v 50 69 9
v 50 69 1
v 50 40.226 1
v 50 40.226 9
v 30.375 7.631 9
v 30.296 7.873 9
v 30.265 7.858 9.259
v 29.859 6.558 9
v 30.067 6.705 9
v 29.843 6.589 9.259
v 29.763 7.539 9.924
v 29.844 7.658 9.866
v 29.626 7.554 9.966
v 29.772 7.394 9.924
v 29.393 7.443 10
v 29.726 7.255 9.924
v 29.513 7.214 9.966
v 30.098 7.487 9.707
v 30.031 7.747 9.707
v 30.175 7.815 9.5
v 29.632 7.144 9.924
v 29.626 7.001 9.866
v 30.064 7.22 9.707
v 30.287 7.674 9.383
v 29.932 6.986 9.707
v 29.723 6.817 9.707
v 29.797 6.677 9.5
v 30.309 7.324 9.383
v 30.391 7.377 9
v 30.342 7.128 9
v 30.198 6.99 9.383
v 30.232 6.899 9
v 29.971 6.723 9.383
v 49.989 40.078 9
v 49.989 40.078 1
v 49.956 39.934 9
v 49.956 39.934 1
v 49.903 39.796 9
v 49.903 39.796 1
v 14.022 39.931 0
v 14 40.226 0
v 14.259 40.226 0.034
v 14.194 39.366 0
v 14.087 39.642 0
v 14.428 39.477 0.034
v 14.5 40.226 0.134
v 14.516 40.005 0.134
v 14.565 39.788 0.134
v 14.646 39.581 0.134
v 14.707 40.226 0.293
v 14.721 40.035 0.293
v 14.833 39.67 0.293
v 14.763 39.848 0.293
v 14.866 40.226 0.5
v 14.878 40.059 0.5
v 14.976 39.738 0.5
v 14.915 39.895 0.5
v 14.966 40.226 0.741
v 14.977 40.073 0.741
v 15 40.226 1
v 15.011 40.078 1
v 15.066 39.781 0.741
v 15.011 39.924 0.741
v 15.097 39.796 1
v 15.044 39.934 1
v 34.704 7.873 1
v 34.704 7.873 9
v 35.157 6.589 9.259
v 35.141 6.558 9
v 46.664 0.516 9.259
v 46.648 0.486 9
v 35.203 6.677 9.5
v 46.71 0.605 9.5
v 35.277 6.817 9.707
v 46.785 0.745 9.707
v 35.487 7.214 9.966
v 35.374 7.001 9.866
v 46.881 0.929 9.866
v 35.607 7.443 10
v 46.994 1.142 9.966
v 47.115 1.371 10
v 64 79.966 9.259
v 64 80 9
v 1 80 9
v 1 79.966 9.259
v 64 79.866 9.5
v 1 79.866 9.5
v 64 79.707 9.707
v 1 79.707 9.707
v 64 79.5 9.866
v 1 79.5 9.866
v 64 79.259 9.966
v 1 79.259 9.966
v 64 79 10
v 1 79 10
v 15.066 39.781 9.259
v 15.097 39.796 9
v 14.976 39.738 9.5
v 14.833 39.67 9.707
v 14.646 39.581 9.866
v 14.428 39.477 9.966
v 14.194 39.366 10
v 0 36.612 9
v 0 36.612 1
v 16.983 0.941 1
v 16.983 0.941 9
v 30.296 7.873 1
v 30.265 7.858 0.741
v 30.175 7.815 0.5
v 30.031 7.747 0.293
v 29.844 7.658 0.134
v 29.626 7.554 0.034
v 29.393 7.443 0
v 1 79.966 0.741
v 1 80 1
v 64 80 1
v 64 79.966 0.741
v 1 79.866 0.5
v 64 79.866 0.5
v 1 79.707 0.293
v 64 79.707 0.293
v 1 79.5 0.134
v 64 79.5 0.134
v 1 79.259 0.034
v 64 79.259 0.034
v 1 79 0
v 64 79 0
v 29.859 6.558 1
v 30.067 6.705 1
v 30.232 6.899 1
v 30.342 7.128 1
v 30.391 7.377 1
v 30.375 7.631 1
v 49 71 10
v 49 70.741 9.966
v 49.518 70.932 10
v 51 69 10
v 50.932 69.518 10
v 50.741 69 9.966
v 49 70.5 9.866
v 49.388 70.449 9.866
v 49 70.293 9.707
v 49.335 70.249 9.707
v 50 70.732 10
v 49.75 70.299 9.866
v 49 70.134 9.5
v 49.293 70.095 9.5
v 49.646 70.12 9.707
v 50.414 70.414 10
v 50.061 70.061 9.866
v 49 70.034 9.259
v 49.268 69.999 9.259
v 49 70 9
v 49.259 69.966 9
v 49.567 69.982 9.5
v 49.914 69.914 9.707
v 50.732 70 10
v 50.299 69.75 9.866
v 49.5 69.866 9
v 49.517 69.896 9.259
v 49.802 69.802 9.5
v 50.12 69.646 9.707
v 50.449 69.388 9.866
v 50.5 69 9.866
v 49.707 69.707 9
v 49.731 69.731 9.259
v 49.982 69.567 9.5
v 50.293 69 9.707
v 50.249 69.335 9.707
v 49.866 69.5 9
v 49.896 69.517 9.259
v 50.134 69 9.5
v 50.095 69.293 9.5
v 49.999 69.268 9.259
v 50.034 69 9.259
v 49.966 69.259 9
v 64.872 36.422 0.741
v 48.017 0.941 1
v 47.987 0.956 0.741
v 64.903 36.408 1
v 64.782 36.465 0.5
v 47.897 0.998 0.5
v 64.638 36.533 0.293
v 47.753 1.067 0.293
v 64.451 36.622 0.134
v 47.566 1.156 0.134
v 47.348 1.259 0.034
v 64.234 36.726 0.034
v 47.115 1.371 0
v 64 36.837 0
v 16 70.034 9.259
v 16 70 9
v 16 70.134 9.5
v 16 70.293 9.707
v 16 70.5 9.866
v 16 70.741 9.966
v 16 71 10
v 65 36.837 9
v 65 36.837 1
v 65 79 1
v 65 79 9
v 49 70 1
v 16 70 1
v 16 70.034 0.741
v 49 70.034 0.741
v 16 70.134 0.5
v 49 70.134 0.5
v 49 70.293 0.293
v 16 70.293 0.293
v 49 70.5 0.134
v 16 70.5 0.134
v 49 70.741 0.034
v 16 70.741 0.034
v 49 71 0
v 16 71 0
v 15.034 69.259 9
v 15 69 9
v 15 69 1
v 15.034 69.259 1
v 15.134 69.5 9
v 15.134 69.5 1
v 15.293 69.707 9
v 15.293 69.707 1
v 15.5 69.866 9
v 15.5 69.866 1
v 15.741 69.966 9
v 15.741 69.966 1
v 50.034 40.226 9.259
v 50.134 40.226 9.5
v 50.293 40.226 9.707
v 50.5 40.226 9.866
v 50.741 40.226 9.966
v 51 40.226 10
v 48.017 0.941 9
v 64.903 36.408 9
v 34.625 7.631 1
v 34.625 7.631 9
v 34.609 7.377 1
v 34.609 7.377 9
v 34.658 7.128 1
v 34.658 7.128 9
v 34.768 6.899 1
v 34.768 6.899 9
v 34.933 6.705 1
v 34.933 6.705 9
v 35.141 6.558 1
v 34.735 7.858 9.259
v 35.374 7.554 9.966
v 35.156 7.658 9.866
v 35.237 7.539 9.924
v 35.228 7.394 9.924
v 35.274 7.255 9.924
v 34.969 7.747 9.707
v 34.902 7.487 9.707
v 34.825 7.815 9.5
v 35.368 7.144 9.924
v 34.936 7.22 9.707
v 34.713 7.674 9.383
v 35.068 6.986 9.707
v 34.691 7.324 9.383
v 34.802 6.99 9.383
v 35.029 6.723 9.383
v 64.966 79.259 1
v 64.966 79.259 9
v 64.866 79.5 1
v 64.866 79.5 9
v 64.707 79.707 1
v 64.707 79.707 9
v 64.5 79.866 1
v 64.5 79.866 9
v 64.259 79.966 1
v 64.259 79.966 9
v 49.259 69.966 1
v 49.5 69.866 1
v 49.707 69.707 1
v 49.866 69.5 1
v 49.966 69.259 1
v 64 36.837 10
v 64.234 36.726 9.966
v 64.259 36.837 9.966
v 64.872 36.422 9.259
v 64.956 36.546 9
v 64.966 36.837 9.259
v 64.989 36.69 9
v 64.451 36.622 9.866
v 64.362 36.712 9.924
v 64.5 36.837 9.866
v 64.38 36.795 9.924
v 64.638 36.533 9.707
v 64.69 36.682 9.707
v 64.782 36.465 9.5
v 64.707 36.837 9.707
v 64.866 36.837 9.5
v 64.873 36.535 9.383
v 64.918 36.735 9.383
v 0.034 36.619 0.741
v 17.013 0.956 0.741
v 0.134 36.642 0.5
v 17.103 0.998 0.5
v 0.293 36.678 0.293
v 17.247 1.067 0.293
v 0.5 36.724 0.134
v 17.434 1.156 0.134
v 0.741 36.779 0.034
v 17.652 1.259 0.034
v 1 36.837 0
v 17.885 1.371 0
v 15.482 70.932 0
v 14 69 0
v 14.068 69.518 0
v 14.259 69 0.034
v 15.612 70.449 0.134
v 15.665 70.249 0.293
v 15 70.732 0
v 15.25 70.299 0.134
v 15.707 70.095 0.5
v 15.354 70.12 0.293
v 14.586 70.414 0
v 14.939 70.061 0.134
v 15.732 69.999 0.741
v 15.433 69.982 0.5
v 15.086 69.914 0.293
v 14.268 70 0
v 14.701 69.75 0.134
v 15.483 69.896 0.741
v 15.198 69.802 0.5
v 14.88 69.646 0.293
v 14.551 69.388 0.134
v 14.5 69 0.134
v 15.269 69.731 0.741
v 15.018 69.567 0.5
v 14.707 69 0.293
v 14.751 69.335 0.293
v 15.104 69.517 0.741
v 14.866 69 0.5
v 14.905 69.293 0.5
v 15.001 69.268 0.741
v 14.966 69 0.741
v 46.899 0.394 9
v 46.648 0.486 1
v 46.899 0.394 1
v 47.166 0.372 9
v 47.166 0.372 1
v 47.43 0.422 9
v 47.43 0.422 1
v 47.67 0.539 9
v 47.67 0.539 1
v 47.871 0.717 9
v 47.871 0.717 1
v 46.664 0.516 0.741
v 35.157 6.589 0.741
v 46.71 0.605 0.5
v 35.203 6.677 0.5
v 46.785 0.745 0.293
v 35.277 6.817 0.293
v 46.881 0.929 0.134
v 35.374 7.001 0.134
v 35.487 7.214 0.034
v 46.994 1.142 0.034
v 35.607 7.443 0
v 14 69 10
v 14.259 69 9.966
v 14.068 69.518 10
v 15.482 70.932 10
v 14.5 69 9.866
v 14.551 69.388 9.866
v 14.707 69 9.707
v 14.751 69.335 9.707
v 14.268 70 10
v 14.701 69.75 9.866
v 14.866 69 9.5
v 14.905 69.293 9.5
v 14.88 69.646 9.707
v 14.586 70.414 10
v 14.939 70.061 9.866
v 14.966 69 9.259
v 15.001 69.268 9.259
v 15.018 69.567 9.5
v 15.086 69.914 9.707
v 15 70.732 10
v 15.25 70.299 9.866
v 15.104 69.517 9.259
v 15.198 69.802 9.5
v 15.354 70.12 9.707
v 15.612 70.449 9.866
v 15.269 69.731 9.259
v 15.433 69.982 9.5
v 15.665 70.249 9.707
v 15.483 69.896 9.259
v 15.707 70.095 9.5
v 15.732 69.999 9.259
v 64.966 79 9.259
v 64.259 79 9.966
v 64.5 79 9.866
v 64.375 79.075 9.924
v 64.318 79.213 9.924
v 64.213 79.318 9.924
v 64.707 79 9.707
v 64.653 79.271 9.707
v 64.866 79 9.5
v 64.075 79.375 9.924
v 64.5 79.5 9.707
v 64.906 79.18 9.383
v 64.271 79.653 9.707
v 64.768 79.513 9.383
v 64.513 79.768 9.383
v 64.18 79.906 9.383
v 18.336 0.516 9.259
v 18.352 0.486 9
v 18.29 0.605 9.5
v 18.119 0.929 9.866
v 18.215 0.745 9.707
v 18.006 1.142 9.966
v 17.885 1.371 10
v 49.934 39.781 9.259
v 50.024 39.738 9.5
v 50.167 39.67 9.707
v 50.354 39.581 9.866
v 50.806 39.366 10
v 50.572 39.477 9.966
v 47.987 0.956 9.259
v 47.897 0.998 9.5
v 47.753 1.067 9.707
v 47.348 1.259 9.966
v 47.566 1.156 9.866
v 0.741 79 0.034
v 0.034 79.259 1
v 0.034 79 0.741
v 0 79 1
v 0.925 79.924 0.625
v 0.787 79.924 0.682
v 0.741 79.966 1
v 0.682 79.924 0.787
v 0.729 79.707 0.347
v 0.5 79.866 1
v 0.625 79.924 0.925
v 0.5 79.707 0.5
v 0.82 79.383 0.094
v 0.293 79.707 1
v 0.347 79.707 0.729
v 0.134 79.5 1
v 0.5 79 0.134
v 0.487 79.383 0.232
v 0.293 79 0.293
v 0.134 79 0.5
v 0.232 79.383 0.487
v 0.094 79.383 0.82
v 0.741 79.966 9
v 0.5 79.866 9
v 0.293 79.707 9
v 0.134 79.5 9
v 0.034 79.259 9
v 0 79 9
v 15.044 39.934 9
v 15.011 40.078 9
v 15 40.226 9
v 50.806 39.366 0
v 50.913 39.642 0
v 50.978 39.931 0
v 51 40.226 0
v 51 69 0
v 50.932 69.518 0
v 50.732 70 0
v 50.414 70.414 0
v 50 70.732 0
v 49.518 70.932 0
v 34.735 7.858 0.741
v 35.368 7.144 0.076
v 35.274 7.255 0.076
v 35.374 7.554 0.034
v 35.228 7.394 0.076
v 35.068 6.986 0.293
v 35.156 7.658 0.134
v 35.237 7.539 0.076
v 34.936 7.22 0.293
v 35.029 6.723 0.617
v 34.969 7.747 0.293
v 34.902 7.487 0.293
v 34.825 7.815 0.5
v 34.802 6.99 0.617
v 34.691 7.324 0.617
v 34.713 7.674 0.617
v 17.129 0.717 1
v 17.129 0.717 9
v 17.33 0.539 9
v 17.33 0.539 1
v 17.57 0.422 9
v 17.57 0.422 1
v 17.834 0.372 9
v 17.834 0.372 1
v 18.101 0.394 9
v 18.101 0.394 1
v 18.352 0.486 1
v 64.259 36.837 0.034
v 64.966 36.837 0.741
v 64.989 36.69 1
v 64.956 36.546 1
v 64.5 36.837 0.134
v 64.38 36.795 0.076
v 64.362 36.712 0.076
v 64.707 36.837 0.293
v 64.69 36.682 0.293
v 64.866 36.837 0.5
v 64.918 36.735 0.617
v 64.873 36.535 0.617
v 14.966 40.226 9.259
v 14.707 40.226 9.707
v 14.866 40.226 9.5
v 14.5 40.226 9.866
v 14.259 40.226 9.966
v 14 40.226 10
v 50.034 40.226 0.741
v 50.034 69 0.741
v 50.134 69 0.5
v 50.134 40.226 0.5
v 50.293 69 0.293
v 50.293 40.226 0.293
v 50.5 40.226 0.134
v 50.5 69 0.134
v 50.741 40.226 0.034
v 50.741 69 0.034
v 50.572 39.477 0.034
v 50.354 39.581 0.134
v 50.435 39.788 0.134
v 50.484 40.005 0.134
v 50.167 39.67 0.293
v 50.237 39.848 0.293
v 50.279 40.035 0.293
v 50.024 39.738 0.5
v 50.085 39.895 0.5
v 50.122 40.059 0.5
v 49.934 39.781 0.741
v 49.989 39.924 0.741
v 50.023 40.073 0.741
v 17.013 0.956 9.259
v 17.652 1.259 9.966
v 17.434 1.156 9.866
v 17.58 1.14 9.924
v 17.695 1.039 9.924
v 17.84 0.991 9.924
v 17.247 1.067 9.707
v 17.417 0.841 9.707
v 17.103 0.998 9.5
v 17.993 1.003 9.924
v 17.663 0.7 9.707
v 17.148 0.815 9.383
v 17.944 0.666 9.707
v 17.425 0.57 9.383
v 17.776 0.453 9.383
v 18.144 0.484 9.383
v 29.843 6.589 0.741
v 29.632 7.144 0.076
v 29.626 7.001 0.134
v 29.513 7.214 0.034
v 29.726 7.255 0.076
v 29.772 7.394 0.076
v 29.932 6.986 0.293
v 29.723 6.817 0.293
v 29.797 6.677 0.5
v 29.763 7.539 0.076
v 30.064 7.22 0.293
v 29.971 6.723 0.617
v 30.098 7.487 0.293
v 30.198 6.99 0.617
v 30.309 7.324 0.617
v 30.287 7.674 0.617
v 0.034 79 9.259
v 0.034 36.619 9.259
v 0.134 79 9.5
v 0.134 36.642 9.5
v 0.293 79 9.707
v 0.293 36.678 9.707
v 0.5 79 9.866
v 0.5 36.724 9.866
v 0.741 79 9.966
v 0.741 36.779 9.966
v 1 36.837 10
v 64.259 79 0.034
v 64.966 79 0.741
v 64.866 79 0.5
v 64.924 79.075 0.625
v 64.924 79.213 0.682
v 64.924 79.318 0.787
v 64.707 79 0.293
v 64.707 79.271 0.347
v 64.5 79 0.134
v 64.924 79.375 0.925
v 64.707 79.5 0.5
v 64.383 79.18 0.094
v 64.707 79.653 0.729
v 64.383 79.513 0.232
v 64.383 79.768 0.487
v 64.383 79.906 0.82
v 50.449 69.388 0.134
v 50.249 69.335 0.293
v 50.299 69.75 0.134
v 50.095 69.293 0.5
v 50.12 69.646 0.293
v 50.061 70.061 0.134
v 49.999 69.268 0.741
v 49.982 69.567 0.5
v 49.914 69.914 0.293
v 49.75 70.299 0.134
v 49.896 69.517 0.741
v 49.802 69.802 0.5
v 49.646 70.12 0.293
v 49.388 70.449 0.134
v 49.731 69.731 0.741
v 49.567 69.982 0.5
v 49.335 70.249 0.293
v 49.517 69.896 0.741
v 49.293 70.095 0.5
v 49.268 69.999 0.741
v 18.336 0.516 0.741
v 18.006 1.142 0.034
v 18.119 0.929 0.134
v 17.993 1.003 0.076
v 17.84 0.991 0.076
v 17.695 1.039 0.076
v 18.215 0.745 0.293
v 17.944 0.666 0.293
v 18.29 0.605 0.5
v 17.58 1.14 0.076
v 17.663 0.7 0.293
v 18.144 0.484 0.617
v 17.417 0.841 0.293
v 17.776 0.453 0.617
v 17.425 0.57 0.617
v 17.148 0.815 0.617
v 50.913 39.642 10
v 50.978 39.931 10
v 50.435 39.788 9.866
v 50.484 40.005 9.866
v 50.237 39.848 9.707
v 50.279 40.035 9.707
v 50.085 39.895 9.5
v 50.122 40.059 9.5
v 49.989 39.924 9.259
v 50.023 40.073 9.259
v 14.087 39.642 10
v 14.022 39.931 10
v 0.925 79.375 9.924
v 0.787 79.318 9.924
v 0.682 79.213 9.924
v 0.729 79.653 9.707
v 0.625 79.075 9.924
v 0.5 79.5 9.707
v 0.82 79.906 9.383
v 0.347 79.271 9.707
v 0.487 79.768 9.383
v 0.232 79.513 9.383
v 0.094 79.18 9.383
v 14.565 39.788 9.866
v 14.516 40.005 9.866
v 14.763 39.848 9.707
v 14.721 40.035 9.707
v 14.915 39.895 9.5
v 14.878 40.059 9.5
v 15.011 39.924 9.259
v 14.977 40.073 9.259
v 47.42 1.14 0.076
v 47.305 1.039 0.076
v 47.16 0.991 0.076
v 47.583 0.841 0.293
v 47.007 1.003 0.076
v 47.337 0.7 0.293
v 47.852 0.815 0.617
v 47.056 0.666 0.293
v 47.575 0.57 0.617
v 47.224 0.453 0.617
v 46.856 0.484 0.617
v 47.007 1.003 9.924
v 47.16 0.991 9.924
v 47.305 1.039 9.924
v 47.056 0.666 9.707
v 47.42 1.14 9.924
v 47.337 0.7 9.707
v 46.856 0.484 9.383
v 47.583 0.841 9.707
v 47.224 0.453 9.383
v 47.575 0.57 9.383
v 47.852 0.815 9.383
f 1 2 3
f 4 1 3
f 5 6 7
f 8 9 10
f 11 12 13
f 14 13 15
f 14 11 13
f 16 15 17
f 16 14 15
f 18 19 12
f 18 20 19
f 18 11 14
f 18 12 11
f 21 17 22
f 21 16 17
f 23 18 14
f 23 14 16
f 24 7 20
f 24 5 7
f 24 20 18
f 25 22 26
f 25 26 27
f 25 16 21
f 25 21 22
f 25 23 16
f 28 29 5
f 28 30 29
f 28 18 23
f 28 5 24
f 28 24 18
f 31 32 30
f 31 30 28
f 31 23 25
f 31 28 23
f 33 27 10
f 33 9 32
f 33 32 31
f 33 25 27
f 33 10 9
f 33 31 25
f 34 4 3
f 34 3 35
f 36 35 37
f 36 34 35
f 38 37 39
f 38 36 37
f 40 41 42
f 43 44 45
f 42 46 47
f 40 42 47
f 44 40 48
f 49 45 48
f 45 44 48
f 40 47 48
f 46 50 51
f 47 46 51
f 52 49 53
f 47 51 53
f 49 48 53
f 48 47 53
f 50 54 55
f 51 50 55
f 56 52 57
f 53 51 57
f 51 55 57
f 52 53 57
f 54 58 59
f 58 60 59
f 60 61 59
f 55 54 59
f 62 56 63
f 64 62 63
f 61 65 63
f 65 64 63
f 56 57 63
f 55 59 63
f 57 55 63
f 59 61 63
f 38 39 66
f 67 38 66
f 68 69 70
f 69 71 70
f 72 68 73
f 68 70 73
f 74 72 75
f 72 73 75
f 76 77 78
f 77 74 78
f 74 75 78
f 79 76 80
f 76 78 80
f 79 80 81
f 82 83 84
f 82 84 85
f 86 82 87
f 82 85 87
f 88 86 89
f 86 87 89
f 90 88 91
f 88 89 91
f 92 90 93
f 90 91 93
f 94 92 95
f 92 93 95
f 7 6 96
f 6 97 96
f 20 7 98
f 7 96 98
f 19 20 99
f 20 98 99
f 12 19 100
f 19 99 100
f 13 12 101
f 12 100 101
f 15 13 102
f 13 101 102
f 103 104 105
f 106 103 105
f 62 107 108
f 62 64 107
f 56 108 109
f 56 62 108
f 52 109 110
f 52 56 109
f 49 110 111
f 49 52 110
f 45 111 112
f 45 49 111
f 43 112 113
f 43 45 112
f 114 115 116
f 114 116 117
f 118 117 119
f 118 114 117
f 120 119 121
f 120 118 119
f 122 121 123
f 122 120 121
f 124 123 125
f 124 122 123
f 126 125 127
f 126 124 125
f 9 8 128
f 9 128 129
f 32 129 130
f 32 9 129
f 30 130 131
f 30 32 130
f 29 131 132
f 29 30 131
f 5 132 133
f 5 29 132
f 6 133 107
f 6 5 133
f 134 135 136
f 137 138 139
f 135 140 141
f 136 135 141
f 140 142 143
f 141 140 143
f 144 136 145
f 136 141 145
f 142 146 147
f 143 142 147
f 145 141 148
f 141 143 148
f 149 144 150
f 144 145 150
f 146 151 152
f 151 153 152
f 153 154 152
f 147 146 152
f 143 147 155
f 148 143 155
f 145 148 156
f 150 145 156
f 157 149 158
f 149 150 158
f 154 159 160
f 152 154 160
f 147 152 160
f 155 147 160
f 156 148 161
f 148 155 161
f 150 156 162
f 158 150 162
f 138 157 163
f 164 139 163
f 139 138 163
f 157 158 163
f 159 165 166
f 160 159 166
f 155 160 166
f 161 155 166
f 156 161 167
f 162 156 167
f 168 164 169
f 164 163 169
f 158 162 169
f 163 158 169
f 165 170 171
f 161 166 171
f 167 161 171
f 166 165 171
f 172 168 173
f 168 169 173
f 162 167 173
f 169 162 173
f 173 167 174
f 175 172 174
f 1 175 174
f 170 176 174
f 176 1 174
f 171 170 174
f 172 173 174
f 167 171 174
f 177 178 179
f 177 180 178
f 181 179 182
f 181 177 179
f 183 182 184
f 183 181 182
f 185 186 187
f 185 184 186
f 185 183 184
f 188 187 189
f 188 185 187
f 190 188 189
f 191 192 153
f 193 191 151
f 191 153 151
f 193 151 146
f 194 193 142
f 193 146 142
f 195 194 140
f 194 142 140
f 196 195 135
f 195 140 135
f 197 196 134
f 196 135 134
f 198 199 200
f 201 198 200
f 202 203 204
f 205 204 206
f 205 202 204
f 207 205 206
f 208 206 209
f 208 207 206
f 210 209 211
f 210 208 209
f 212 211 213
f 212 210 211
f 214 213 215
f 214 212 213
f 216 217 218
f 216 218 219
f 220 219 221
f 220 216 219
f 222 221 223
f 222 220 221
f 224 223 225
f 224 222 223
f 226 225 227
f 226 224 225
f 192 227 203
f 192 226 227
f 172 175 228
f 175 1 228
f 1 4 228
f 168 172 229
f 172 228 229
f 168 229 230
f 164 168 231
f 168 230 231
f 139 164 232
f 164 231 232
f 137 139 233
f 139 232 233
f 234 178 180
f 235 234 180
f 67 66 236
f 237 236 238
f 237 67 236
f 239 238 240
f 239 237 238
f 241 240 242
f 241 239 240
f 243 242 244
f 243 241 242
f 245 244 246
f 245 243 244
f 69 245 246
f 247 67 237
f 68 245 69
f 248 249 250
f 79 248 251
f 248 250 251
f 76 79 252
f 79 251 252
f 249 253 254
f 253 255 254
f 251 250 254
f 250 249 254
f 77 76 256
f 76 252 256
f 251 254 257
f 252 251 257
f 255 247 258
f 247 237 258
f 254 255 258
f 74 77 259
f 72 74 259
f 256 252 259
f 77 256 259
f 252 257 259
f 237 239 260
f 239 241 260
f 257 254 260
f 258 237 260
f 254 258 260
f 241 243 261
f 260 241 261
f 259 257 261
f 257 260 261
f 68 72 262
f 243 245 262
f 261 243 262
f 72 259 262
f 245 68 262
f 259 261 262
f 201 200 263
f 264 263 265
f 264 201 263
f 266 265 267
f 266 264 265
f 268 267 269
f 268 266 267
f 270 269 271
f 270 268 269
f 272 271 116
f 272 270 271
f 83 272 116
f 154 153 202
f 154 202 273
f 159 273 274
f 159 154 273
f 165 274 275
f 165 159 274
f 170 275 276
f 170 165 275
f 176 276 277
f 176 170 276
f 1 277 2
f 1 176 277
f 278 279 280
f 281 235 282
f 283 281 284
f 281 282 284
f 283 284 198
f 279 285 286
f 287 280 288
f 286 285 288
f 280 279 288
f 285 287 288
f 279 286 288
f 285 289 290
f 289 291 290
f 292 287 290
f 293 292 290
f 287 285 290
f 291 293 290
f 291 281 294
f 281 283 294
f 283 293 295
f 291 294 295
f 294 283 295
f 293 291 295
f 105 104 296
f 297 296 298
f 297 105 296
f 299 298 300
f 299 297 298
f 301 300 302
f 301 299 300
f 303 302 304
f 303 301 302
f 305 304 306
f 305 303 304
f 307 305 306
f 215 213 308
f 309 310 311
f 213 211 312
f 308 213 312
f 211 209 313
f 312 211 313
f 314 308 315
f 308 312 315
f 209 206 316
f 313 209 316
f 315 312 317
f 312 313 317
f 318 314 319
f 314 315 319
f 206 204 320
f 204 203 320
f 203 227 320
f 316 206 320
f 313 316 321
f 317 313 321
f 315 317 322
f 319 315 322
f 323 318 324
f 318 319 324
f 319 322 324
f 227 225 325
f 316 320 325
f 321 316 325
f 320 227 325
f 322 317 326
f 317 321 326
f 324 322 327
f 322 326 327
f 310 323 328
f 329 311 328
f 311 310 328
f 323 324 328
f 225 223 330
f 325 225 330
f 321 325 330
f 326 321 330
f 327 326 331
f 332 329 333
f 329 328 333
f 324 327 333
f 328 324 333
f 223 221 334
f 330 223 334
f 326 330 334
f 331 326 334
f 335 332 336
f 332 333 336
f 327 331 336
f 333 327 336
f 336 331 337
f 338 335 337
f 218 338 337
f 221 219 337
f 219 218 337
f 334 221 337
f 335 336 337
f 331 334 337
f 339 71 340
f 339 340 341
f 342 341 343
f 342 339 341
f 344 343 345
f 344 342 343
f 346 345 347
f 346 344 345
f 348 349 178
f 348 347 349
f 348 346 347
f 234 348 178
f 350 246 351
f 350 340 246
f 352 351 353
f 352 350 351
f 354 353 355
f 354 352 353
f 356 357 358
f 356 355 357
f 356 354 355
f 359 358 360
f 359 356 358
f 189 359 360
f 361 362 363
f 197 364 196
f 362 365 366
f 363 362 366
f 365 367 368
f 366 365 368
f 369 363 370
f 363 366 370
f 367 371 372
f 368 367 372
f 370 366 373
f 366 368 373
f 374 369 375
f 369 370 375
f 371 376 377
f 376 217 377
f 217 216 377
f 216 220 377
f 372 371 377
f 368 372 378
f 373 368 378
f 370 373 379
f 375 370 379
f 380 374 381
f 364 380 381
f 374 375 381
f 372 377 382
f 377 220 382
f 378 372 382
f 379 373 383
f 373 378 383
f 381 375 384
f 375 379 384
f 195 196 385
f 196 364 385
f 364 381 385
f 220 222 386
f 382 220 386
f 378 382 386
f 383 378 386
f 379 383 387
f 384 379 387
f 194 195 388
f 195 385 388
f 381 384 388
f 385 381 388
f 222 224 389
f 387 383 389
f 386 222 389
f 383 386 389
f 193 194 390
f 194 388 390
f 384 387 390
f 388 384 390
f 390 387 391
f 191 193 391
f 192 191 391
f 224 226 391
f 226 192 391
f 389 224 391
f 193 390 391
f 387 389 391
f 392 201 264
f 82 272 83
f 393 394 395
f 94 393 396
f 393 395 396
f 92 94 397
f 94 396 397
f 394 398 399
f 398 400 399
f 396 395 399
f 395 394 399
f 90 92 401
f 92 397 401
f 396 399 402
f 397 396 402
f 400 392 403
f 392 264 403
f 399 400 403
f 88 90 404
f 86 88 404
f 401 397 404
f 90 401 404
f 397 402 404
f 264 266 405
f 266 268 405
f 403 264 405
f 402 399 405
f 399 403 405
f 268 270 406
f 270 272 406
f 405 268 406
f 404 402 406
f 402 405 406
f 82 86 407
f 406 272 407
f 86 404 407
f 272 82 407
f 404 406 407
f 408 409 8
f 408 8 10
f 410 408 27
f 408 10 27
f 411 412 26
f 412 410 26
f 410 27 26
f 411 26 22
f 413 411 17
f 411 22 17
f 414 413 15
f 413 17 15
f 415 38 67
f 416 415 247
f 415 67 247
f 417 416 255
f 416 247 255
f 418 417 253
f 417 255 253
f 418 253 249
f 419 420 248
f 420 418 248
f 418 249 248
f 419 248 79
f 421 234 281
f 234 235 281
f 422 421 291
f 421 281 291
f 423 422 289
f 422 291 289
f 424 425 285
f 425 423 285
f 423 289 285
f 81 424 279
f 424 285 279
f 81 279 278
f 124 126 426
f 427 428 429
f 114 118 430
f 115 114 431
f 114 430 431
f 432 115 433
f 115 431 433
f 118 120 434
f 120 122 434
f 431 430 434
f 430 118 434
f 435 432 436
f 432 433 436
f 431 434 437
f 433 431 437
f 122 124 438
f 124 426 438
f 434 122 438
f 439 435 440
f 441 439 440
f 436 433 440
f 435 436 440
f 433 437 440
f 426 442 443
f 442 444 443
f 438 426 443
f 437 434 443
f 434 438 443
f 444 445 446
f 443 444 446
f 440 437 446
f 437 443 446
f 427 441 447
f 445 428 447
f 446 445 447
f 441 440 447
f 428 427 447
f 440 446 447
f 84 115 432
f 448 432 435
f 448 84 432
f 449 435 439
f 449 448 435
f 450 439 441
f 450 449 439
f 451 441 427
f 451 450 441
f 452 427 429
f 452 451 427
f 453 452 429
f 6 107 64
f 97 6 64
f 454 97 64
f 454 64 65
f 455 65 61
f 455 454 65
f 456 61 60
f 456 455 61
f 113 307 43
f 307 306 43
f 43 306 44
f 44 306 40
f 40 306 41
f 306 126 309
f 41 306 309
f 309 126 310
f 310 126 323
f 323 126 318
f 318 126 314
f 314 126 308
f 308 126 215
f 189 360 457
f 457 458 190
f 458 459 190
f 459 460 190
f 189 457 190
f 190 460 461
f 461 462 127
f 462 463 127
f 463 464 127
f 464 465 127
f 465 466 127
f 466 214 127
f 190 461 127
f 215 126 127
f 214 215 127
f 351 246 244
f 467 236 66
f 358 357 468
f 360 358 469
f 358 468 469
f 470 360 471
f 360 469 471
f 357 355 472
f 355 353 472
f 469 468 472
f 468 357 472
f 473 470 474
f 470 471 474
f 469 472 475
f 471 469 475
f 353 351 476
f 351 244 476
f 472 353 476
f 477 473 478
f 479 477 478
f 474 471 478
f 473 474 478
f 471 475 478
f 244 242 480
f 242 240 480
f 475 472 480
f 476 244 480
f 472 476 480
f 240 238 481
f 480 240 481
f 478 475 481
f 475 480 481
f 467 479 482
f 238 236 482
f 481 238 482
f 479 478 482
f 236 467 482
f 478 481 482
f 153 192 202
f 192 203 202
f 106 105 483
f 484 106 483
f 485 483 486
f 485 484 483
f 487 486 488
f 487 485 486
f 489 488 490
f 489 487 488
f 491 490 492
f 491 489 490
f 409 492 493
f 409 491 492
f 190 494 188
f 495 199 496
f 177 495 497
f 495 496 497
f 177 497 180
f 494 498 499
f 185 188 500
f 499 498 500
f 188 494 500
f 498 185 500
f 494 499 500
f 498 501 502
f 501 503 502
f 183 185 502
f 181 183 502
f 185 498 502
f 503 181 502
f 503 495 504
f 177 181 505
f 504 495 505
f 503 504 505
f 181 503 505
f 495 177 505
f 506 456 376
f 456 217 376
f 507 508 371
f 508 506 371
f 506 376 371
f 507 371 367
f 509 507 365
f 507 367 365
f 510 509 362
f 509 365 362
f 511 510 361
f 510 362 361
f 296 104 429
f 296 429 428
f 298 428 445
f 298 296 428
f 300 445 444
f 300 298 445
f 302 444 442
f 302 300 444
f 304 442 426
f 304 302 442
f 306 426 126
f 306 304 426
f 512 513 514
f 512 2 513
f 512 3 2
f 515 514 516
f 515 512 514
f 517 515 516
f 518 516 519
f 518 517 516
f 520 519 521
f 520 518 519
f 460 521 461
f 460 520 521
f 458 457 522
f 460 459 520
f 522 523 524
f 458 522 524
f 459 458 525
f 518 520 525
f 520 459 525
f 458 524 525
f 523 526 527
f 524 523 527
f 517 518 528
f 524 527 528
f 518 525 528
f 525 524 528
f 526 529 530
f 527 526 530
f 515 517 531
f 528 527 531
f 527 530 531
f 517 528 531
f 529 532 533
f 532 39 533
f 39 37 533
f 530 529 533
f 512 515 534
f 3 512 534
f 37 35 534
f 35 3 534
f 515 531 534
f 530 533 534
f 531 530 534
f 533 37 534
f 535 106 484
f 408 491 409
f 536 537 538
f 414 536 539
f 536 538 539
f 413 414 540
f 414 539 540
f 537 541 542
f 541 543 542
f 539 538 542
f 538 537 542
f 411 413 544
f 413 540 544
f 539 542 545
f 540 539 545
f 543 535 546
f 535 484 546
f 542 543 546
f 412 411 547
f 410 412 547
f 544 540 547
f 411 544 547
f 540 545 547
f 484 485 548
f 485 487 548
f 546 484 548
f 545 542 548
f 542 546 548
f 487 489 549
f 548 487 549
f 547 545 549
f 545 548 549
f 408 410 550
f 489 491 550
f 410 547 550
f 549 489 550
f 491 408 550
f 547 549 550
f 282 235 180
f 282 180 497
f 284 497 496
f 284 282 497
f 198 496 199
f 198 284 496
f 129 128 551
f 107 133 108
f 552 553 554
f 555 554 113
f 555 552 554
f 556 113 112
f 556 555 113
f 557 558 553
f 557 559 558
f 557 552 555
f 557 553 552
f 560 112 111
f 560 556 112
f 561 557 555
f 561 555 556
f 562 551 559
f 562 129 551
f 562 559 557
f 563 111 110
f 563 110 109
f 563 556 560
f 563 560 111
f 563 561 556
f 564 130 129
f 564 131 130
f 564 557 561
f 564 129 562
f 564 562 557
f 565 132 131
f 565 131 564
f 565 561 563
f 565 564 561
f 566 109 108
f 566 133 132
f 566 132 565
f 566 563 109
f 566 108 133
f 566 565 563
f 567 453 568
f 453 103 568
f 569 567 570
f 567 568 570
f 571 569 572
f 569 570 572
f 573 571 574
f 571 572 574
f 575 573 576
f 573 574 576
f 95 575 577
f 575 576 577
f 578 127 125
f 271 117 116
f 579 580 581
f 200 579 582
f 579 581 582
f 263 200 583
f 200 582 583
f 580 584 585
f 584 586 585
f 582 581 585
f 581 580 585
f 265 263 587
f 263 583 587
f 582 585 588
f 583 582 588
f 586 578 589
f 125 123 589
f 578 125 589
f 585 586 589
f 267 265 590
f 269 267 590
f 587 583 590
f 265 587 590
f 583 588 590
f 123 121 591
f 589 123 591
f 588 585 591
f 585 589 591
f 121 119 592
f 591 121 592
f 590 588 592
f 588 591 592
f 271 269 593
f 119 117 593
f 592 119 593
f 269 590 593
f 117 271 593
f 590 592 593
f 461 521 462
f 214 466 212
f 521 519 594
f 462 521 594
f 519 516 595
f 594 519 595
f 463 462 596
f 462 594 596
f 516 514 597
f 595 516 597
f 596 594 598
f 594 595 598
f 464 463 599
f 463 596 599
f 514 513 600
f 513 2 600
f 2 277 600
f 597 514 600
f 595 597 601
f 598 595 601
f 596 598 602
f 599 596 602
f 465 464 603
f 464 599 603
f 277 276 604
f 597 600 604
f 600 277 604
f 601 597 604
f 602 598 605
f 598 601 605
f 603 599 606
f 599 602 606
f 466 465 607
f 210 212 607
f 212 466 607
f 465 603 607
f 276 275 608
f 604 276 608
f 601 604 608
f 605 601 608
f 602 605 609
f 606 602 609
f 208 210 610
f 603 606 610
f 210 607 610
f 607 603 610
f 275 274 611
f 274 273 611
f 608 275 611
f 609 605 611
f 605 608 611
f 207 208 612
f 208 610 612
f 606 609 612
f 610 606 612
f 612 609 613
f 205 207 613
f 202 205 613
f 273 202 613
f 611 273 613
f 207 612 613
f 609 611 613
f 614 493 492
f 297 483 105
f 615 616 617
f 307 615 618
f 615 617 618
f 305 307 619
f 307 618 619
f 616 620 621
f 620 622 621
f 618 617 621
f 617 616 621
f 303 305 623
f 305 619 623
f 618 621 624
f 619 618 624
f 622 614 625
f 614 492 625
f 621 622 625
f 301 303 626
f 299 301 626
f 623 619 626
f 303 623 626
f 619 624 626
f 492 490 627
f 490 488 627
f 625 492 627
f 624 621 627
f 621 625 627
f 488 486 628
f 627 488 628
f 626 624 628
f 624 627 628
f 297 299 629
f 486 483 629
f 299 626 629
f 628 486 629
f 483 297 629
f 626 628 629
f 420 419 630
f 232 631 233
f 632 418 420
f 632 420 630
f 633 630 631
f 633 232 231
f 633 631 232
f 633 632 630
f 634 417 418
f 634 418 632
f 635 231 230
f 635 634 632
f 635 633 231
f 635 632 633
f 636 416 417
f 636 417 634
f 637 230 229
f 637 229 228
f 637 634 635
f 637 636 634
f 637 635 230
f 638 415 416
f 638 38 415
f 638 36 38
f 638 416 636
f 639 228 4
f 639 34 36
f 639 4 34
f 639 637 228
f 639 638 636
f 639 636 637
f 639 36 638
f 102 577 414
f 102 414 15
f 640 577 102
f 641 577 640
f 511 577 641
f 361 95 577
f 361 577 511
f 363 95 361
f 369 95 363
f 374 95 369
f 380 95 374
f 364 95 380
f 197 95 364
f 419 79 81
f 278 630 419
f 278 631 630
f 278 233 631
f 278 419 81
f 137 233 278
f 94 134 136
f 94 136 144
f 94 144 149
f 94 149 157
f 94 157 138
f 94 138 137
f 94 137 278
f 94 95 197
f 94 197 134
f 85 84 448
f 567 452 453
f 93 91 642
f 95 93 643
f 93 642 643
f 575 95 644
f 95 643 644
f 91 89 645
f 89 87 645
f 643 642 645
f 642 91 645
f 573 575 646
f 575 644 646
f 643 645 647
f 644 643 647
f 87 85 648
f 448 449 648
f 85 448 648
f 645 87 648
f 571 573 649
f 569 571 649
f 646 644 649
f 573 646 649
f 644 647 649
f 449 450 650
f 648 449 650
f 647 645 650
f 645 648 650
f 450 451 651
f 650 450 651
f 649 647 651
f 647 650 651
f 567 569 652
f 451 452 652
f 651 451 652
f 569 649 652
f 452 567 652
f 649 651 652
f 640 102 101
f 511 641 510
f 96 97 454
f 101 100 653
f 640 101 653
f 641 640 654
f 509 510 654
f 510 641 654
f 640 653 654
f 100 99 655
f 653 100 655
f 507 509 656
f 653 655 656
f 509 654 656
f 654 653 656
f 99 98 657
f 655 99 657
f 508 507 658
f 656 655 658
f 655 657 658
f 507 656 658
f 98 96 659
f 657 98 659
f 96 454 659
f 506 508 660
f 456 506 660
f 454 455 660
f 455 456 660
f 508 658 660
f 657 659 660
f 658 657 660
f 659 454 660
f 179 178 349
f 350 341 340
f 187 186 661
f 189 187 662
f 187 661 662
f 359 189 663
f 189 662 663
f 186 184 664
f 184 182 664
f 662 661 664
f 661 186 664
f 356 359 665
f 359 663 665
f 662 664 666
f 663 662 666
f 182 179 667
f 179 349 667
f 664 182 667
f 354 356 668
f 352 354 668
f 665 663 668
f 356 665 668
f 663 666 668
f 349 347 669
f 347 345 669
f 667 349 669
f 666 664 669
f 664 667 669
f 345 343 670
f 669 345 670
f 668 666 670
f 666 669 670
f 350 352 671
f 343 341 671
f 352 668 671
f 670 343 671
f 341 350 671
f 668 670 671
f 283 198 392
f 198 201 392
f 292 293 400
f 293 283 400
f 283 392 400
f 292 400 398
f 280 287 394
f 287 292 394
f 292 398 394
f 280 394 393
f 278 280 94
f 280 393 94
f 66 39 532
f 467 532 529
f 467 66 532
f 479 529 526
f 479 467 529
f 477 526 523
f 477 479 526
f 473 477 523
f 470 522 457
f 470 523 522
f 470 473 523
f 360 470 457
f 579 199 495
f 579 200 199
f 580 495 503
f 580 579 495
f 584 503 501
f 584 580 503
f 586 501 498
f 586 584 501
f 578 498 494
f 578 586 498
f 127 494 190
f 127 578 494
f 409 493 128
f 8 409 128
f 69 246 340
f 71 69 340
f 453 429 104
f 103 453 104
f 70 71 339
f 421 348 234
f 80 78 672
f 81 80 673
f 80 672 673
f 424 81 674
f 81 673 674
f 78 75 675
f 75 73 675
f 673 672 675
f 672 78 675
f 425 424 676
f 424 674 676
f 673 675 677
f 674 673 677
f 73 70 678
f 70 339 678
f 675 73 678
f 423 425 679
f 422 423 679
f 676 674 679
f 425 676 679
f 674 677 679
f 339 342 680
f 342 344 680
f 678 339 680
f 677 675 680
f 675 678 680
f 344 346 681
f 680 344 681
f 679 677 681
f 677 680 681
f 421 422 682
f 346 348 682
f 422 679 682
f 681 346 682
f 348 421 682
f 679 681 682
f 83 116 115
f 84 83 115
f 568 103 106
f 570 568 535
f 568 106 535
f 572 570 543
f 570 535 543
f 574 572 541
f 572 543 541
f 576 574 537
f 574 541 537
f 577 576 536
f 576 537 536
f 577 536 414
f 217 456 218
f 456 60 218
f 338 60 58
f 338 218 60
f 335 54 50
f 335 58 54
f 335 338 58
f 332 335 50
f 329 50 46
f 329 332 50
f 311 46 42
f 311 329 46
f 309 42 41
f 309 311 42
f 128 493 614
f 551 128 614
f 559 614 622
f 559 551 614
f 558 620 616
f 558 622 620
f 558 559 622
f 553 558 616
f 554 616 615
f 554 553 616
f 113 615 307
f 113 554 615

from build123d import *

# Parameters (mm, degrees)
BOSS_EXTRUDE1_DEPTH = 10
FILLET1_R           = 1


with BuildPart() as part:
    # Sketch1 → Boss-Extrude1 (new body)
    with BuildSketch(Plane.XY):
        Polygon((0, 40), (0, 36.611522599), (17.430453908, 0), (30.708058647, 7.006255421), (15, 40), (15, 70), (50, 70), (50, 40), (34.291941353, 7.006255421), (47.569546092, 0), (65, 36.611522599), (65, 80), (0, 80), align=None)
    extrude(amount=BOSS_EXTRUDE1_DEPTH)

    # Fillet1
    fillet1_edges = [part.edges().sort_by_distance(p)[0] for p in [
        (15, 55, 10),
        (24.069256278, 3.50312771, 0),
        (8.715226954, 18.3057613, 0),
        (0, 58.3057613, 0),
        (32.5, 80, 0),
        (65, 58.3057613, 0),
        (32.5, 70, 10),
        (56.284773046, 18.3057613, 0),
        (40.930743722, 3.50312771, 0),
        (42.145970676, 23.50312771, 0),
        (50, 55, 0),
        (32.5, 70, 0),
        (15, 55, 0),
        (22.854029324, 23.50312771, 0),
        (50, 55, 10),
        (30.708058647, 7.006255421, 5),
        (17.430453908, 0, 5),
        (0, 80, 5),
        (65, 80, 5),
        (65, 36.611522599, 5),
        (47.569546092, 0, 5),
        (34.291941353, 7.006255421, 5),
        (50, 40, 5),
        (50, 70, 5),
        (15, 70, 5),
        (15, 40, 5),
        (42.145970676, 23.50312771, 10),
        (40.930743722, 3.50312771, 10),
        (56.284773046, 18.3057613, 10),
        (65, 58.3057613, 10),
        (32.5, 80, 10),
        (0, 58.3057613, 10),
        (8.715226954, 18.3057613, 10),
        (22.854029324, 23.50312771, 10),
        (24.069256278, 3.50312771, 10),
    ]]
    fillet(fillet1_edges, radius=FILLET1_R)


solid = part.part
